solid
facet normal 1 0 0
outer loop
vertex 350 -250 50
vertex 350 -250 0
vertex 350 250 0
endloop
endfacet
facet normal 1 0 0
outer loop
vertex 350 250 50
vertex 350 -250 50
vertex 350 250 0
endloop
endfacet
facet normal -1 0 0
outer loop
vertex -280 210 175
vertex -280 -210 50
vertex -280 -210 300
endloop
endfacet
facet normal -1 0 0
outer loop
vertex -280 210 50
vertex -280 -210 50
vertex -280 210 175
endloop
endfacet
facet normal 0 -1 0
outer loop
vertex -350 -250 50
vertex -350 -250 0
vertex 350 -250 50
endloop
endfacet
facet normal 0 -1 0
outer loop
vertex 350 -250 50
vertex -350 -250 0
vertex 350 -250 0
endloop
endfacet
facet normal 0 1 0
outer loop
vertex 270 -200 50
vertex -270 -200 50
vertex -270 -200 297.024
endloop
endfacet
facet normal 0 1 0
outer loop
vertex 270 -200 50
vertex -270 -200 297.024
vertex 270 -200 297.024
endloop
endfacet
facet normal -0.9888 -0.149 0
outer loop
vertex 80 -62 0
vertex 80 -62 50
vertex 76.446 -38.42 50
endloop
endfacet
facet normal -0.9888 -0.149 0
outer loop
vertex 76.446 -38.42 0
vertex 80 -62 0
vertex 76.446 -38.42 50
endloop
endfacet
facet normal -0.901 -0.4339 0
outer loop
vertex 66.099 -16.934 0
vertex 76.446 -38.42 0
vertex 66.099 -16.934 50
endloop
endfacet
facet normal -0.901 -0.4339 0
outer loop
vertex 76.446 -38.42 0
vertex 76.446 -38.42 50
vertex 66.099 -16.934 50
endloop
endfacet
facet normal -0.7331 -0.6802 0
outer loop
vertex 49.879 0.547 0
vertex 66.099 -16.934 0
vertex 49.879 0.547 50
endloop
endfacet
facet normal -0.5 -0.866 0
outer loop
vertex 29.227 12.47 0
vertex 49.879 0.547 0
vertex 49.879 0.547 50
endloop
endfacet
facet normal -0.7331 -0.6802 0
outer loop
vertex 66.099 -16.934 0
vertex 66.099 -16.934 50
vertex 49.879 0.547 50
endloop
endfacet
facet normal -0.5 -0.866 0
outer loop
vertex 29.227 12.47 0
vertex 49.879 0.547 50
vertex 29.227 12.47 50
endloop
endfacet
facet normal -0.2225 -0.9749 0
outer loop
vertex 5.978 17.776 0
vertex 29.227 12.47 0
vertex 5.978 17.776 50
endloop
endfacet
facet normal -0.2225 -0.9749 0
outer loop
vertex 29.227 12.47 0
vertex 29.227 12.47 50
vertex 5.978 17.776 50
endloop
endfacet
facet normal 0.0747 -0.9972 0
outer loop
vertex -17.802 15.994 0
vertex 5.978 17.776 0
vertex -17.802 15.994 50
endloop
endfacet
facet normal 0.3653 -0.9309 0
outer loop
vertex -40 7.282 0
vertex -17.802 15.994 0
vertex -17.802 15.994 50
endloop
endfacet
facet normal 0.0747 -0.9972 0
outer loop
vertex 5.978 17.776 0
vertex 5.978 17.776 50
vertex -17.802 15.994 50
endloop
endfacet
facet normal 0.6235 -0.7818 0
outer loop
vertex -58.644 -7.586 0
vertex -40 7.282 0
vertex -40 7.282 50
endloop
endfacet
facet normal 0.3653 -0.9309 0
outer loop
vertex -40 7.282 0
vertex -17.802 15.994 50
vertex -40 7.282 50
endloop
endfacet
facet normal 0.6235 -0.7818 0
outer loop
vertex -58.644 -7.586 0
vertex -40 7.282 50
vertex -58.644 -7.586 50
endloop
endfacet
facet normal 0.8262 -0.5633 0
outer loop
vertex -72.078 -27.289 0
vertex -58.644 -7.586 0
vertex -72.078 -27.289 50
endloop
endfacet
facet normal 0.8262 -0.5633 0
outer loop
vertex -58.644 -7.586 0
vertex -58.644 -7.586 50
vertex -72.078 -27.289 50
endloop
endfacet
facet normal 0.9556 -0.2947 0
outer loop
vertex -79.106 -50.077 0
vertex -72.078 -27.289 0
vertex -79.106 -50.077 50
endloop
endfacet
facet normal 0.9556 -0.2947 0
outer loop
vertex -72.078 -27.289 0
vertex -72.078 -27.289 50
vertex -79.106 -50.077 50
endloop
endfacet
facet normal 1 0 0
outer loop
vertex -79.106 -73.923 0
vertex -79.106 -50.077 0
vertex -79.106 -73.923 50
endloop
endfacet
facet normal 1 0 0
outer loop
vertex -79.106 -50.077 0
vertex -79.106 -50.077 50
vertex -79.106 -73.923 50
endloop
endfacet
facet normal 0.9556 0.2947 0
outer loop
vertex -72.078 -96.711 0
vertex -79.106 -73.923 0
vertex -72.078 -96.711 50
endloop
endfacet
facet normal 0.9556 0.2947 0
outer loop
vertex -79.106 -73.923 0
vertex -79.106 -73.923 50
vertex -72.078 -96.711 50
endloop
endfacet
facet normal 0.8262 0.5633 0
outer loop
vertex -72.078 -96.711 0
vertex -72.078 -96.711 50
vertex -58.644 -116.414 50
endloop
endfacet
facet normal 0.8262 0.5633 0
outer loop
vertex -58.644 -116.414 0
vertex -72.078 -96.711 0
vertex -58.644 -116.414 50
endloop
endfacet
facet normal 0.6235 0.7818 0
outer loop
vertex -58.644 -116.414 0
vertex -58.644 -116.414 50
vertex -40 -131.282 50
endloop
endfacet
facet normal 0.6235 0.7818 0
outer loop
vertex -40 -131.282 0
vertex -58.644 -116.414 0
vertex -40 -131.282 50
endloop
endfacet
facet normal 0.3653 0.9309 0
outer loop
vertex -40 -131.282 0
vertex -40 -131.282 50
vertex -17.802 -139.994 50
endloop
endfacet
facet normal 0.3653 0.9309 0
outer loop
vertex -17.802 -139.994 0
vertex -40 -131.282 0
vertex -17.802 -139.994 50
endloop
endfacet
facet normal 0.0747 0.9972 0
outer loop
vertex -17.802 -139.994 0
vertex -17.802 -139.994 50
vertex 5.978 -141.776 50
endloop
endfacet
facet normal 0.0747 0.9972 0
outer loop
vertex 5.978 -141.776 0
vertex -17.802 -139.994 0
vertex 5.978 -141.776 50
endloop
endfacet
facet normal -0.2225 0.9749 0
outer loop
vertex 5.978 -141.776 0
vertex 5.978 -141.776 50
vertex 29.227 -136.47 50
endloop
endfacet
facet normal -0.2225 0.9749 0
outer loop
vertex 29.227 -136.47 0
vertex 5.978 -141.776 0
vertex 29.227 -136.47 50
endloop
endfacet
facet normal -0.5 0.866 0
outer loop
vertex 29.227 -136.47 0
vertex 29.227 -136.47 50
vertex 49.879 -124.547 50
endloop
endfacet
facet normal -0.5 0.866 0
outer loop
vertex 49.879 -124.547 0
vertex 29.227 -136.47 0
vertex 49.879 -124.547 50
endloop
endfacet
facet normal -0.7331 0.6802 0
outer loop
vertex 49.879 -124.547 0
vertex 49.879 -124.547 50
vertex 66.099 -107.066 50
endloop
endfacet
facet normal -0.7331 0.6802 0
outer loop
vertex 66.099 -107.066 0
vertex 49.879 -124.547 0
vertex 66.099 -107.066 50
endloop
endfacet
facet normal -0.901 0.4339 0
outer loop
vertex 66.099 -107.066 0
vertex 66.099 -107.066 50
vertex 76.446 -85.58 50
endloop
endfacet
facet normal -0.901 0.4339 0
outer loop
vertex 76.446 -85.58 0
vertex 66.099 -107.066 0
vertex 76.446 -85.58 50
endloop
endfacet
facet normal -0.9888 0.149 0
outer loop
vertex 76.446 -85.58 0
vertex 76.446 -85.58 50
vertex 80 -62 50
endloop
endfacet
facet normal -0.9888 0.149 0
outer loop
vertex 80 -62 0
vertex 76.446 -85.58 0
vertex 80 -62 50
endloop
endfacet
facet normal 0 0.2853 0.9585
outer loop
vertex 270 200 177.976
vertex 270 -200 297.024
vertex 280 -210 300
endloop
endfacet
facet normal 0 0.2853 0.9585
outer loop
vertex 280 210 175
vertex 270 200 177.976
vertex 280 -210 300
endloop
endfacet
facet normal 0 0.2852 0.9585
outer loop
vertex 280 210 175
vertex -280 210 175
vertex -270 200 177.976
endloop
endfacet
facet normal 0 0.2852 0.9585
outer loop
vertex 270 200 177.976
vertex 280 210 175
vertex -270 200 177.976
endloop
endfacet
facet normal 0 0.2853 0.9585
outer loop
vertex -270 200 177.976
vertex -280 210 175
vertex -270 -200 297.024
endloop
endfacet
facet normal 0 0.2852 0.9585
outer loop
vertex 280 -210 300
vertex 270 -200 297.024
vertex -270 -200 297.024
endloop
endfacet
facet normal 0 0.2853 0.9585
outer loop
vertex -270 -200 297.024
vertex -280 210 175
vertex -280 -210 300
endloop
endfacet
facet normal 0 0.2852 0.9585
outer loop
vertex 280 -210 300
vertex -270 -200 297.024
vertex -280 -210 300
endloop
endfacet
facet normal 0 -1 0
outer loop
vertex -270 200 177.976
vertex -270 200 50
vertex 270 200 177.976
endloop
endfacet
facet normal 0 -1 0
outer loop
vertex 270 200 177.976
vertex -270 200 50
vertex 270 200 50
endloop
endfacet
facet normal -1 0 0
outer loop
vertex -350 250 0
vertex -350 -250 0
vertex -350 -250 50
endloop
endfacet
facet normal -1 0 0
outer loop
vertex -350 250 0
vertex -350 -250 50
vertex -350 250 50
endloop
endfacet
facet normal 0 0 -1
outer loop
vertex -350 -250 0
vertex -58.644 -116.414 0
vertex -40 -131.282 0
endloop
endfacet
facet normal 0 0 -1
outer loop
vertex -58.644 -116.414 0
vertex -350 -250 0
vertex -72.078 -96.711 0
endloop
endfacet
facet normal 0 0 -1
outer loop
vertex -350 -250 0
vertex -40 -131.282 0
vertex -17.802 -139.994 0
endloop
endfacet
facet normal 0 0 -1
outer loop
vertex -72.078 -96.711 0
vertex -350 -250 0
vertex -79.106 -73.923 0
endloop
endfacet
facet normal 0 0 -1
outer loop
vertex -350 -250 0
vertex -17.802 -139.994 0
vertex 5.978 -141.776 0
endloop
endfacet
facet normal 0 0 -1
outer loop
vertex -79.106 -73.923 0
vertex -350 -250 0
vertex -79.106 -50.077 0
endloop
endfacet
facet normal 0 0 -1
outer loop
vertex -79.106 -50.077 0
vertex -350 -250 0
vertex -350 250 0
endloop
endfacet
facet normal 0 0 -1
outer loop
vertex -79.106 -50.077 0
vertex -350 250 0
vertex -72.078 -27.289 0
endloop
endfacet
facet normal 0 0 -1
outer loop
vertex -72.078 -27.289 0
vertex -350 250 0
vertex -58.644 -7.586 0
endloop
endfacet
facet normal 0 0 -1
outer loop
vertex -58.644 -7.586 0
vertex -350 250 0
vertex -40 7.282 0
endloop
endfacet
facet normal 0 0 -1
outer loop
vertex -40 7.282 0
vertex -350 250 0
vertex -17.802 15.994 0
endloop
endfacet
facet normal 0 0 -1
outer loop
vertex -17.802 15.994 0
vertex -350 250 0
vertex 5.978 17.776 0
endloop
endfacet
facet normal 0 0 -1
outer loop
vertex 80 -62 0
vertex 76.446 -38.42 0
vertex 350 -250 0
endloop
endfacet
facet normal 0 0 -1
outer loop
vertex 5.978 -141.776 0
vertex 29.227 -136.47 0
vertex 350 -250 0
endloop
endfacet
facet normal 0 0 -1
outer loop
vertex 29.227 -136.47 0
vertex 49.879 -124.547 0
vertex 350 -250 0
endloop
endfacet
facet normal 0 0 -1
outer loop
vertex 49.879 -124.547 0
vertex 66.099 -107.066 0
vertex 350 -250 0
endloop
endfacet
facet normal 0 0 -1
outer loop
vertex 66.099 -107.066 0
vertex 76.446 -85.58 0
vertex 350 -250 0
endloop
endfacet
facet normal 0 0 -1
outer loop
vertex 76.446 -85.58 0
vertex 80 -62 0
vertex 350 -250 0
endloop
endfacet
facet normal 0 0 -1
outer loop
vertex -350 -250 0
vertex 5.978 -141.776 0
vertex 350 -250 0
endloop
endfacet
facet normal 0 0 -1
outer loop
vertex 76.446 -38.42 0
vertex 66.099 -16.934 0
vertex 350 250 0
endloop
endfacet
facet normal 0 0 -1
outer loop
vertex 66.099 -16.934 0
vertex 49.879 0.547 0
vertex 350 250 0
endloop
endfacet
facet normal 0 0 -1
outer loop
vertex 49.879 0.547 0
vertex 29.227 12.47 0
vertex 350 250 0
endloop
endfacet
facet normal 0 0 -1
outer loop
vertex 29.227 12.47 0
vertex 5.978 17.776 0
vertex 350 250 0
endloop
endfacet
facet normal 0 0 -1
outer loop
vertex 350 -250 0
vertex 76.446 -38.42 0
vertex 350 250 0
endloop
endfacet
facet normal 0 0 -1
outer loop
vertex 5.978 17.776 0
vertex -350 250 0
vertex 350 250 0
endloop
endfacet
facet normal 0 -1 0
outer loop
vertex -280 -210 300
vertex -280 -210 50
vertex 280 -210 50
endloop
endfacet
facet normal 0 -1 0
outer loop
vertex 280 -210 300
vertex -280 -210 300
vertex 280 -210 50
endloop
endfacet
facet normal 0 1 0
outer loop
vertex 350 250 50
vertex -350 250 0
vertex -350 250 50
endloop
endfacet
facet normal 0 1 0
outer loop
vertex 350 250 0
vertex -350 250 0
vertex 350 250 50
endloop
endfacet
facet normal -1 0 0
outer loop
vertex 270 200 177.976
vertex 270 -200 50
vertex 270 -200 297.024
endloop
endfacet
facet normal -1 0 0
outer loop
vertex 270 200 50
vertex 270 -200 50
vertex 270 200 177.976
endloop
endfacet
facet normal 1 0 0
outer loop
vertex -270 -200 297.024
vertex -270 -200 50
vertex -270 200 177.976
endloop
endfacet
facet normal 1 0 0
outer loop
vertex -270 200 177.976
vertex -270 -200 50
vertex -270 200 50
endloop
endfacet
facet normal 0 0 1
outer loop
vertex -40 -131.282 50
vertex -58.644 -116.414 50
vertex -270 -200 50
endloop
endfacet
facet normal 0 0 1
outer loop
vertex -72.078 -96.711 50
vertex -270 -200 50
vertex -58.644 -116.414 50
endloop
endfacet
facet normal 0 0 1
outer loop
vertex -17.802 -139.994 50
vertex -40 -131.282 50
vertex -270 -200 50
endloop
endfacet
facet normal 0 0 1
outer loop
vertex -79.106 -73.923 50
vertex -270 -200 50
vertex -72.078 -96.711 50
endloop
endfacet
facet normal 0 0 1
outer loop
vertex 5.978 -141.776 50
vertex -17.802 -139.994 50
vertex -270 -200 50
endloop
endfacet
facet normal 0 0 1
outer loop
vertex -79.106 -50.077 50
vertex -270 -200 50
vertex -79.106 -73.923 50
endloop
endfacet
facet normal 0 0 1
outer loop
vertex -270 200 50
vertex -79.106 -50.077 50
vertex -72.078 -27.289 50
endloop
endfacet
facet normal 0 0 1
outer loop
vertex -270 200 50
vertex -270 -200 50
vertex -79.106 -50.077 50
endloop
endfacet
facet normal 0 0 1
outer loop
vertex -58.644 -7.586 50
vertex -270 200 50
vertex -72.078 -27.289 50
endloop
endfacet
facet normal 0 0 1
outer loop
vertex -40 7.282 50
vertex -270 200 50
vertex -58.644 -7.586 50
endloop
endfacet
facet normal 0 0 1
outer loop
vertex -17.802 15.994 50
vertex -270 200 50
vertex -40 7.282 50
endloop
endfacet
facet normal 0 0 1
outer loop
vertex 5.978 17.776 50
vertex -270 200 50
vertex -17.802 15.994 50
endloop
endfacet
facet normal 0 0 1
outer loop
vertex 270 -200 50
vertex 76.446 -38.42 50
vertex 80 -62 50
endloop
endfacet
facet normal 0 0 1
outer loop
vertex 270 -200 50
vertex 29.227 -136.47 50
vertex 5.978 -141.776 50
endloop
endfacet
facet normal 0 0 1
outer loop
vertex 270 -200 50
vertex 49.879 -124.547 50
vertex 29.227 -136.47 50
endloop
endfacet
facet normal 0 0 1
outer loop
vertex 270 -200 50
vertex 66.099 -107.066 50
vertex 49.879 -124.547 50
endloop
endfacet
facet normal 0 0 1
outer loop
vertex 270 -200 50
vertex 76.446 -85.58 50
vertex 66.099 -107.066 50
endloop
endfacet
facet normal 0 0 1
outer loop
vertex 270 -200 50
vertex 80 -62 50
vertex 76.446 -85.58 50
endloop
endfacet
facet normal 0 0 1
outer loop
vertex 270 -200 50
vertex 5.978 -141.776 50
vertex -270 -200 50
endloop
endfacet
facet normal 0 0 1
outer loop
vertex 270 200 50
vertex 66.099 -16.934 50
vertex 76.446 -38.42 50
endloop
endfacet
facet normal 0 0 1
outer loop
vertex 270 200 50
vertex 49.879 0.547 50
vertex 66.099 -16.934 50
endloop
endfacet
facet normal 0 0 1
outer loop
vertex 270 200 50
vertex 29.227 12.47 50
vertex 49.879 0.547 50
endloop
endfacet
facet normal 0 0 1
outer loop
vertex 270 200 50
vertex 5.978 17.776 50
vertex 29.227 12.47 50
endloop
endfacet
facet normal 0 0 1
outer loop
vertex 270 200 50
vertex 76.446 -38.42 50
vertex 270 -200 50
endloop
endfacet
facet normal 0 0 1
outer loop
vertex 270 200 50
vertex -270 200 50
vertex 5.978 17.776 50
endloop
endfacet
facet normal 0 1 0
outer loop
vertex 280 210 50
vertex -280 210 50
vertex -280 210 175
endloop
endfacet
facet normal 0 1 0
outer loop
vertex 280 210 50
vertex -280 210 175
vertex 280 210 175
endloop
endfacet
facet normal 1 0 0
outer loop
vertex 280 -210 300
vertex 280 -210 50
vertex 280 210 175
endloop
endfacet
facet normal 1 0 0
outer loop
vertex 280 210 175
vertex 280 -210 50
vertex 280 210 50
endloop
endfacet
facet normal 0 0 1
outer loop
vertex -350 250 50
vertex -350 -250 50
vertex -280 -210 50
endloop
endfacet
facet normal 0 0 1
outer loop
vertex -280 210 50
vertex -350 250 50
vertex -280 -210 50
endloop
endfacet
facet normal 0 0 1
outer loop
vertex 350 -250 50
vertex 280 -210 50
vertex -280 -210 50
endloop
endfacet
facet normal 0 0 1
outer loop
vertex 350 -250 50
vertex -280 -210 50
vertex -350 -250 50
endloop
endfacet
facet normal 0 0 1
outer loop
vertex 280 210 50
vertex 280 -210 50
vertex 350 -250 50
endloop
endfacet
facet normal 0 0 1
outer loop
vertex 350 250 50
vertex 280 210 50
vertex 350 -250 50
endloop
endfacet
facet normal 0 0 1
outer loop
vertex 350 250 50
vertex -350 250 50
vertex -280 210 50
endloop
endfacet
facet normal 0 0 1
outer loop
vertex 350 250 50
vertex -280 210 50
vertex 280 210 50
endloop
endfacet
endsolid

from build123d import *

# Parameters (mm, degrees)
SKETCH1_W               = 700
SKETCH1_H               = 500
BOSS_EXTRUDE1_DEPTH     = 50
SKETCH2_W               = 560
SKETCH2_H               = 420
SKETCH2_W_2             = 540
SKETCH2_H_2             = 400
EXTRUDE_THIN1_DEPTH     = 250
CUT_EXTRUDE5_DEPTH      = 71
CUT_EXTRUDE5_DEPTH_BACK = 631
SKETCH4_R               = 80
CUT_EXTRUDE6_DEPTH      = 51


with BuildPart() as part:
    # Sketch1 → Boss-Extrude1 (new body)
    with BuildSketch(Plane.XY):
        Rectangle(SKETCH1_W, SKETCH1_H)
    extrude(amount=BOSS_EXTRUDE1_DEPTH)

    # Sketch2 → Extrude-Thin1 (add)
    with BuildSketch(Plane.XY.offset(50)):
        Rectangle(SKETCH2_W, SKETCH2_H)
        Rectangle(SKETCH2_W_2, SKETCH2_H_2, mode=Mode.SUBTRACT)
    extrude(amount=EXTRUDE_THIN1_DEPTH)

    # Sketch3 → Cut-Extrude5 (cut, two sides)
    with BuildSketch(Plane.ZY.offset(280)) as cut_extrude5_sk:
        Polygon((300, 210), (175, 210), (300, -210), align=None)
    extrude(amount=CUT_EXTRUDE5_DEPTH, mode=Mode.SUBTRACT)
    extrude(cut_extrude5_sk.sketch, amount=-CUT_EXTRUDE5_DEPTH_BACK, mode=Mode.SUBTRACT)

    # Sketch4 → Cut-Extrude6 (cut, through all)
    with BuildSketch(Plane.XY.offset(50)):
        with Locations((0, -62)):
            Circle(SKETCH4_R)
    extrude(amount=-CUT_EXTRUDE6_DEPTH, mode=Mode.SUBTRACT)


solid = part.part
